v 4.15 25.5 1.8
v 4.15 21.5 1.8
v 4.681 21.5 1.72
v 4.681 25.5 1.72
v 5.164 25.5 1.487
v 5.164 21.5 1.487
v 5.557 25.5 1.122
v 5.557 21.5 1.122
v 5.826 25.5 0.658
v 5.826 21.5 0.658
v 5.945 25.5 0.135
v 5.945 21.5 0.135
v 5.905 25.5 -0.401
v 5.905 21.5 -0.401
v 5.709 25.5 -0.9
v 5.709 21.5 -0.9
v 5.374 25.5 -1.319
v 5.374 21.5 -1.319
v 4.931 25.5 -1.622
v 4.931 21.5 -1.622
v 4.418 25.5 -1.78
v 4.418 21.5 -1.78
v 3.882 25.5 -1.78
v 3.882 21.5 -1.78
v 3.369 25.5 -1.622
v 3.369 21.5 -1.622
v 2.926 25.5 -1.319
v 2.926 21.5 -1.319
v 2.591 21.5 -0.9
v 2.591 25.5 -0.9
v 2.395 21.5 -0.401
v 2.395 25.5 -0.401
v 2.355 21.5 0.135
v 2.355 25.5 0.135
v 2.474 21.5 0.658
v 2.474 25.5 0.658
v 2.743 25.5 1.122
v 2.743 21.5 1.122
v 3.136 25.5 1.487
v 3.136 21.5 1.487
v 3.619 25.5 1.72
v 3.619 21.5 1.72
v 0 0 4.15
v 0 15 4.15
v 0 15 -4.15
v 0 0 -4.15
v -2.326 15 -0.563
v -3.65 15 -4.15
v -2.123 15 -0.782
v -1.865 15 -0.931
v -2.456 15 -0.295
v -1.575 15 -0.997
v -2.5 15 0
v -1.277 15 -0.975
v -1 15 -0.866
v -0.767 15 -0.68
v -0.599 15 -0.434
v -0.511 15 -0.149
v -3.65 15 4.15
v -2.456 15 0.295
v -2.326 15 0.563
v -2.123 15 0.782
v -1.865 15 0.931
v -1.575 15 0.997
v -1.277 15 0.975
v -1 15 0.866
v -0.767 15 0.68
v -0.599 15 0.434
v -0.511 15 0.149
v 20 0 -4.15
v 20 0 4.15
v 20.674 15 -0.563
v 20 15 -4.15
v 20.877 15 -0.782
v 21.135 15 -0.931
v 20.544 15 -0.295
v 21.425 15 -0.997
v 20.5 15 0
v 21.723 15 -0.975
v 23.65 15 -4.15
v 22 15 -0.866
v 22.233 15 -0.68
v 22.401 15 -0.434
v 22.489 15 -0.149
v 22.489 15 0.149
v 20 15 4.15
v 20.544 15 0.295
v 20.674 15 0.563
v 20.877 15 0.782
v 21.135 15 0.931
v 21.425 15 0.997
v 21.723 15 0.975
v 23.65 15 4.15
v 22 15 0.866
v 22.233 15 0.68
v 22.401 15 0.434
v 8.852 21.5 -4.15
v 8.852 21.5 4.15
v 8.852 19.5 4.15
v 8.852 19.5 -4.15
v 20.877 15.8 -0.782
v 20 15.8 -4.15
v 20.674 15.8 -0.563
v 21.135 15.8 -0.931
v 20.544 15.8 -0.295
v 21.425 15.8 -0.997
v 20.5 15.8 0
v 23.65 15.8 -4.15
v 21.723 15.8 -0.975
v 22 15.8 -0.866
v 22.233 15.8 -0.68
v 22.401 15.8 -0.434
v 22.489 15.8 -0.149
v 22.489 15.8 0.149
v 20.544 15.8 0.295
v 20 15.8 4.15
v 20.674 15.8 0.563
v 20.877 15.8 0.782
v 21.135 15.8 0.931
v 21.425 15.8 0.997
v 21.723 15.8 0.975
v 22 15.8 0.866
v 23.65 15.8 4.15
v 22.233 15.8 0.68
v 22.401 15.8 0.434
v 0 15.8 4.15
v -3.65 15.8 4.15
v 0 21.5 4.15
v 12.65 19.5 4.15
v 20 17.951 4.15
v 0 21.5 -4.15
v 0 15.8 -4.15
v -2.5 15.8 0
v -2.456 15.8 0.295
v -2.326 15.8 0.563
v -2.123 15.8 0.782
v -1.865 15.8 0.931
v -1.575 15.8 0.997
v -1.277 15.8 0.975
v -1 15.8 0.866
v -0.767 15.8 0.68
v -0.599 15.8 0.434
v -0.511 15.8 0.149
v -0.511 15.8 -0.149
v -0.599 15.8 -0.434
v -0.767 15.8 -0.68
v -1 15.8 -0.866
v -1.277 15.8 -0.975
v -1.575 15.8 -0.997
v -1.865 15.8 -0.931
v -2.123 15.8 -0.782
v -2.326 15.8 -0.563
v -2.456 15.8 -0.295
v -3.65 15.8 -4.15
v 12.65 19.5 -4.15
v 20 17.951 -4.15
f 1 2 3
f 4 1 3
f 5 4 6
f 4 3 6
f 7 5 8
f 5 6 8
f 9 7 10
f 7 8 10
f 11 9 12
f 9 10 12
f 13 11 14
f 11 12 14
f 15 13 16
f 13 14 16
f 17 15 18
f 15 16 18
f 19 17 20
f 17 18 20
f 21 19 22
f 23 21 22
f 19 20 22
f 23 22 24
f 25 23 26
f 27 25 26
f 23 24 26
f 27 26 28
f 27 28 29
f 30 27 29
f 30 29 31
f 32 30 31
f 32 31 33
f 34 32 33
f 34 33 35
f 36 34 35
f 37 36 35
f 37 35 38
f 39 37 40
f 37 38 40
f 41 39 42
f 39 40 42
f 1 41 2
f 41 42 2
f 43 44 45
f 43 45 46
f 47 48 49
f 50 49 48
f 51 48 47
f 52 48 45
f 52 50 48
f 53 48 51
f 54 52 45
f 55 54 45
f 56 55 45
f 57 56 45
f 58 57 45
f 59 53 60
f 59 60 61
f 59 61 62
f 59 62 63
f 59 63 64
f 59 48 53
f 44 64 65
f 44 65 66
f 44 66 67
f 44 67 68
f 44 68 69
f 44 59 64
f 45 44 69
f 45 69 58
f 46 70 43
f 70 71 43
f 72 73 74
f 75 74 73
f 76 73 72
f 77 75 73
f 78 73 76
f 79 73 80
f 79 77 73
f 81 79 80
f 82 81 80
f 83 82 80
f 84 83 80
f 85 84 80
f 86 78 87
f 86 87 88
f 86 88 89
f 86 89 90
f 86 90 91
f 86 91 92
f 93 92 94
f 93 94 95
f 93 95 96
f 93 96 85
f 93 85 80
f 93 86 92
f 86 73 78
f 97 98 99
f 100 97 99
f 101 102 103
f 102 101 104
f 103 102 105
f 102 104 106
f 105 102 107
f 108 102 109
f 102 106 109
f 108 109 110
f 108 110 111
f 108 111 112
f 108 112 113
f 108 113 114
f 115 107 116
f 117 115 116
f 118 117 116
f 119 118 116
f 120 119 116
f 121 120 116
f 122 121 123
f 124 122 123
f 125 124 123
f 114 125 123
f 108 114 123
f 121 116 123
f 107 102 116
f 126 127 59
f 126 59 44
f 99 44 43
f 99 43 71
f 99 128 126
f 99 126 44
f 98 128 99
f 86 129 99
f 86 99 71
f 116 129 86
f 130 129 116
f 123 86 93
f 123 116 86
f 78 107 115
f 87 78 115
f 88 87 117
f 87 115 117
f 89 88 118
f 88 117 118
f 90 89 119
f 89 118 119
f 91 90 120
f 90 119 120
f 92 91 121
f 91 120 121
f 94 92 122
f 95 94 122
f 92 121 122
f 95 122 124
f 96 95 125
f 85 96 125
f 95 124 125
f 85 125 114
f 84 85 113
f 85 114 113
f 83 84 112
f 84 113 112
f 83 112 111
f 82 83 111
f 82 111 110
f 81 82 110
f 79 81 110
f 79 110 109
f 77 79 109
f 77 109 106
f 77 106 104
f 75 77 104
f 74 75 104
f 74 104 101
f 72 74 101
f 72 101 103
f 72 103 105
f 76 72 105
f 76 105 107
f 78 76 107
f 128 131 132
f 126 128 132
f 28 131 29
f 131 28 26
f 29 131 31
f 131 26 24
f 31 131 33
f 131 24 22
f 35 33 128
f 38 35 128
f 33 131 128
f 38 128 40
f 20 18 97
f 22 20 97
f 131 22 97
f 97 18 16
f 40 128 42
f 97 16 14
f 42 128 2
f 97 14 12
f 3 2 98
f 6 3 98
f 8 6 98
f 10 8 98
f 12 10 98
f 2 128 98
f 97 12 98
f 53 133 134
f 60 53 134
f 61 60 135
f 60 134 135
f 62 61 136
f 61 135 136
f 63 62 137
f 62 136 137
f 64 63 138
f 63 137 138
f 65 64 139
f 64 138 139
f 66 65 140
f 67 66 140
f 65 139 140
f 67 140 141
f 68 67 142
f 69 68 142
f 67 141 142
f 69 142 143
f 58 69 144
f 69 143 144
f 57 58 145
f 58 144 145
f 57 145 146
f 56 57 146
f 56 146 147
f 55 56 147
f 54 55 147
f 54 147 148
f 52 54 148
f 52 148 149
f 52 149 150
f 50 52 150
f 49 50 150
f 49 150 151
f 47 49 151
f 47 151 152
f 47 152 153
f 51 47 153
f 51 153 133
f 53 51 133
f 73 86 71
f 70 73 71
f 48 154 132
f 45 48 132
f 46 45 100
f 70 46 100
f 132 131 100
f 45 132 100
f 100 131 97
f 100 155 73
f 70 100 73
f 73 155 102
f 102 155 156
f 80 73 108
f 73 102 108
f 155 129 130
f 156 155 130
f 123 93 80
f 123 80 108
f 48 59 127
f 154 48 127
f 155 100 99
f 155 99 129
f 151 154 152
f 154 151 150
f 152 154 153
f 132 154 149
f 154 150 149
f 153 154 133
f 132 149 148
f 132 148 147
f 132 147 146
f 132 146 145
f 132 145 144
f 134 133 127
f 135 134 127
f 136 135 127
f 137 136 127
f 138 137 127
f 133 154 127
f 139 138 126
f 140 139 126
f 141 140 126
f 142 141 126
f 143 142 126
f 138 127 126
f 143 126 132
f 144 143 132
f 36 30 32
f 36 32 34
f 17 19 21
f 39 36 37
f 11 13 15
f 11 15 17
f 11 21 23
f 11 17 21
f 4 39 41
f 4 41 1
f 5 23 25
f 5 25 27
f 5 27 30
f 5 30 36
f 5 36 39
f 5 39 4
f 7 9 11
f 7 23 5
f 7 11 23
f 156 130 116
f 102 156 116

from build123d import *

# Parameters (mm, degrees)
EXTRUDE_1_DEPTH     = 4.15
SKETCH_2_W          = 27.3
SKETCH_2_H          = 0.8
EXTRUDE_2_DEPTH     = 8.3
CUT_EXTRUDE_1_REACH = 30.743
SKETCH_3_R          = 1
SKETCH_4_R          = 1.8
EXTRUDE_3_DEPTH     = 4


with BuildPart() as part:
    # 草图1 → 凸台-拉伸1 (new, symmetric)
    with BuildSketch(Plane.XY):
        Polygon((12.649672005, 19.5), (20, 17.950931016), (20, 0), (0, 0), (0, 16.33633198), (0, 21.5), (8.852277233, 21.5), (8.852277233, 19.5), align=None)
    extrude(amount=EXTRUDE_1_DEPTH, both=True)

    # 草图2 → 凸台-拉伸2 (add)
    with BuildSketch(Plane.XY.offset(4.15)):
        with Locations((10, 15.4)):
            Rectangle(SKETCH_2_W, SKETCH_2_H)
    extrude(amount=-EXTRUDE_2_DEPTH)

    # 草图3 → 切除-拉伸1 (cut, up to next)
    with BuildSketch(Plane(origin=(0, 15.8, 0), x_dir=(1, 0, 0), z_dir=(0, 1, 0)), mode=Mode.PRIVATE) as cut_extrude_1_sk1:
        with Locations((-1.5, 0)):
            Circle(SKETCH_3_R)
    cut_extrude_1_tool1 = extrude(cut_extrude_1_sk1.sketch, amount=-CUT_EXTRUDE_1_REACH, mode=Mode.PRIVATE) & part.part
    # 草图3 → 切除-拉伸1 (cut, up to next)
    with BuildSketch(Plane(origin=(0, 15.8, 0), x_dir=(1, 0, 0), z_dir=(0, 1, 0)), mode=Mode.PRIVATE) as cut_extrude_1_sk2:
        with Locations((21.5, 0)):
            Circle(SKETCH_3_R)
    cut_extrude_1_tool2 = extrude(cut_extrude_1_sk2.sketch, amount=-CUT_EXTRUDE_1_REACH, mode=Mode.PRIVATE) & part.part
    add(cut_extrude_1_tool1.solids().sort_by_distance((-1.5, 15.8, 0))[0], mode=Mode.SUBTRACT)
    add(cut_extrude_1_tool2.solids().sort_by_distance((21.5, 15.8, 0))[0], mode=Mode.SUBTRACT)

    # 草图4 → 凸台-拉伸3 (add)
    with BuildSketch(Plane(origin=(0, 21.5, 0), x_dir=(1, 0, 0), z_dir=(0, 1, 0))):
        with Locations((4.15, 0)):
            Circle(SKETCH_4_R)
    extrude(amount=EXTRUDE_3_DEPTH)


solid = part.part
